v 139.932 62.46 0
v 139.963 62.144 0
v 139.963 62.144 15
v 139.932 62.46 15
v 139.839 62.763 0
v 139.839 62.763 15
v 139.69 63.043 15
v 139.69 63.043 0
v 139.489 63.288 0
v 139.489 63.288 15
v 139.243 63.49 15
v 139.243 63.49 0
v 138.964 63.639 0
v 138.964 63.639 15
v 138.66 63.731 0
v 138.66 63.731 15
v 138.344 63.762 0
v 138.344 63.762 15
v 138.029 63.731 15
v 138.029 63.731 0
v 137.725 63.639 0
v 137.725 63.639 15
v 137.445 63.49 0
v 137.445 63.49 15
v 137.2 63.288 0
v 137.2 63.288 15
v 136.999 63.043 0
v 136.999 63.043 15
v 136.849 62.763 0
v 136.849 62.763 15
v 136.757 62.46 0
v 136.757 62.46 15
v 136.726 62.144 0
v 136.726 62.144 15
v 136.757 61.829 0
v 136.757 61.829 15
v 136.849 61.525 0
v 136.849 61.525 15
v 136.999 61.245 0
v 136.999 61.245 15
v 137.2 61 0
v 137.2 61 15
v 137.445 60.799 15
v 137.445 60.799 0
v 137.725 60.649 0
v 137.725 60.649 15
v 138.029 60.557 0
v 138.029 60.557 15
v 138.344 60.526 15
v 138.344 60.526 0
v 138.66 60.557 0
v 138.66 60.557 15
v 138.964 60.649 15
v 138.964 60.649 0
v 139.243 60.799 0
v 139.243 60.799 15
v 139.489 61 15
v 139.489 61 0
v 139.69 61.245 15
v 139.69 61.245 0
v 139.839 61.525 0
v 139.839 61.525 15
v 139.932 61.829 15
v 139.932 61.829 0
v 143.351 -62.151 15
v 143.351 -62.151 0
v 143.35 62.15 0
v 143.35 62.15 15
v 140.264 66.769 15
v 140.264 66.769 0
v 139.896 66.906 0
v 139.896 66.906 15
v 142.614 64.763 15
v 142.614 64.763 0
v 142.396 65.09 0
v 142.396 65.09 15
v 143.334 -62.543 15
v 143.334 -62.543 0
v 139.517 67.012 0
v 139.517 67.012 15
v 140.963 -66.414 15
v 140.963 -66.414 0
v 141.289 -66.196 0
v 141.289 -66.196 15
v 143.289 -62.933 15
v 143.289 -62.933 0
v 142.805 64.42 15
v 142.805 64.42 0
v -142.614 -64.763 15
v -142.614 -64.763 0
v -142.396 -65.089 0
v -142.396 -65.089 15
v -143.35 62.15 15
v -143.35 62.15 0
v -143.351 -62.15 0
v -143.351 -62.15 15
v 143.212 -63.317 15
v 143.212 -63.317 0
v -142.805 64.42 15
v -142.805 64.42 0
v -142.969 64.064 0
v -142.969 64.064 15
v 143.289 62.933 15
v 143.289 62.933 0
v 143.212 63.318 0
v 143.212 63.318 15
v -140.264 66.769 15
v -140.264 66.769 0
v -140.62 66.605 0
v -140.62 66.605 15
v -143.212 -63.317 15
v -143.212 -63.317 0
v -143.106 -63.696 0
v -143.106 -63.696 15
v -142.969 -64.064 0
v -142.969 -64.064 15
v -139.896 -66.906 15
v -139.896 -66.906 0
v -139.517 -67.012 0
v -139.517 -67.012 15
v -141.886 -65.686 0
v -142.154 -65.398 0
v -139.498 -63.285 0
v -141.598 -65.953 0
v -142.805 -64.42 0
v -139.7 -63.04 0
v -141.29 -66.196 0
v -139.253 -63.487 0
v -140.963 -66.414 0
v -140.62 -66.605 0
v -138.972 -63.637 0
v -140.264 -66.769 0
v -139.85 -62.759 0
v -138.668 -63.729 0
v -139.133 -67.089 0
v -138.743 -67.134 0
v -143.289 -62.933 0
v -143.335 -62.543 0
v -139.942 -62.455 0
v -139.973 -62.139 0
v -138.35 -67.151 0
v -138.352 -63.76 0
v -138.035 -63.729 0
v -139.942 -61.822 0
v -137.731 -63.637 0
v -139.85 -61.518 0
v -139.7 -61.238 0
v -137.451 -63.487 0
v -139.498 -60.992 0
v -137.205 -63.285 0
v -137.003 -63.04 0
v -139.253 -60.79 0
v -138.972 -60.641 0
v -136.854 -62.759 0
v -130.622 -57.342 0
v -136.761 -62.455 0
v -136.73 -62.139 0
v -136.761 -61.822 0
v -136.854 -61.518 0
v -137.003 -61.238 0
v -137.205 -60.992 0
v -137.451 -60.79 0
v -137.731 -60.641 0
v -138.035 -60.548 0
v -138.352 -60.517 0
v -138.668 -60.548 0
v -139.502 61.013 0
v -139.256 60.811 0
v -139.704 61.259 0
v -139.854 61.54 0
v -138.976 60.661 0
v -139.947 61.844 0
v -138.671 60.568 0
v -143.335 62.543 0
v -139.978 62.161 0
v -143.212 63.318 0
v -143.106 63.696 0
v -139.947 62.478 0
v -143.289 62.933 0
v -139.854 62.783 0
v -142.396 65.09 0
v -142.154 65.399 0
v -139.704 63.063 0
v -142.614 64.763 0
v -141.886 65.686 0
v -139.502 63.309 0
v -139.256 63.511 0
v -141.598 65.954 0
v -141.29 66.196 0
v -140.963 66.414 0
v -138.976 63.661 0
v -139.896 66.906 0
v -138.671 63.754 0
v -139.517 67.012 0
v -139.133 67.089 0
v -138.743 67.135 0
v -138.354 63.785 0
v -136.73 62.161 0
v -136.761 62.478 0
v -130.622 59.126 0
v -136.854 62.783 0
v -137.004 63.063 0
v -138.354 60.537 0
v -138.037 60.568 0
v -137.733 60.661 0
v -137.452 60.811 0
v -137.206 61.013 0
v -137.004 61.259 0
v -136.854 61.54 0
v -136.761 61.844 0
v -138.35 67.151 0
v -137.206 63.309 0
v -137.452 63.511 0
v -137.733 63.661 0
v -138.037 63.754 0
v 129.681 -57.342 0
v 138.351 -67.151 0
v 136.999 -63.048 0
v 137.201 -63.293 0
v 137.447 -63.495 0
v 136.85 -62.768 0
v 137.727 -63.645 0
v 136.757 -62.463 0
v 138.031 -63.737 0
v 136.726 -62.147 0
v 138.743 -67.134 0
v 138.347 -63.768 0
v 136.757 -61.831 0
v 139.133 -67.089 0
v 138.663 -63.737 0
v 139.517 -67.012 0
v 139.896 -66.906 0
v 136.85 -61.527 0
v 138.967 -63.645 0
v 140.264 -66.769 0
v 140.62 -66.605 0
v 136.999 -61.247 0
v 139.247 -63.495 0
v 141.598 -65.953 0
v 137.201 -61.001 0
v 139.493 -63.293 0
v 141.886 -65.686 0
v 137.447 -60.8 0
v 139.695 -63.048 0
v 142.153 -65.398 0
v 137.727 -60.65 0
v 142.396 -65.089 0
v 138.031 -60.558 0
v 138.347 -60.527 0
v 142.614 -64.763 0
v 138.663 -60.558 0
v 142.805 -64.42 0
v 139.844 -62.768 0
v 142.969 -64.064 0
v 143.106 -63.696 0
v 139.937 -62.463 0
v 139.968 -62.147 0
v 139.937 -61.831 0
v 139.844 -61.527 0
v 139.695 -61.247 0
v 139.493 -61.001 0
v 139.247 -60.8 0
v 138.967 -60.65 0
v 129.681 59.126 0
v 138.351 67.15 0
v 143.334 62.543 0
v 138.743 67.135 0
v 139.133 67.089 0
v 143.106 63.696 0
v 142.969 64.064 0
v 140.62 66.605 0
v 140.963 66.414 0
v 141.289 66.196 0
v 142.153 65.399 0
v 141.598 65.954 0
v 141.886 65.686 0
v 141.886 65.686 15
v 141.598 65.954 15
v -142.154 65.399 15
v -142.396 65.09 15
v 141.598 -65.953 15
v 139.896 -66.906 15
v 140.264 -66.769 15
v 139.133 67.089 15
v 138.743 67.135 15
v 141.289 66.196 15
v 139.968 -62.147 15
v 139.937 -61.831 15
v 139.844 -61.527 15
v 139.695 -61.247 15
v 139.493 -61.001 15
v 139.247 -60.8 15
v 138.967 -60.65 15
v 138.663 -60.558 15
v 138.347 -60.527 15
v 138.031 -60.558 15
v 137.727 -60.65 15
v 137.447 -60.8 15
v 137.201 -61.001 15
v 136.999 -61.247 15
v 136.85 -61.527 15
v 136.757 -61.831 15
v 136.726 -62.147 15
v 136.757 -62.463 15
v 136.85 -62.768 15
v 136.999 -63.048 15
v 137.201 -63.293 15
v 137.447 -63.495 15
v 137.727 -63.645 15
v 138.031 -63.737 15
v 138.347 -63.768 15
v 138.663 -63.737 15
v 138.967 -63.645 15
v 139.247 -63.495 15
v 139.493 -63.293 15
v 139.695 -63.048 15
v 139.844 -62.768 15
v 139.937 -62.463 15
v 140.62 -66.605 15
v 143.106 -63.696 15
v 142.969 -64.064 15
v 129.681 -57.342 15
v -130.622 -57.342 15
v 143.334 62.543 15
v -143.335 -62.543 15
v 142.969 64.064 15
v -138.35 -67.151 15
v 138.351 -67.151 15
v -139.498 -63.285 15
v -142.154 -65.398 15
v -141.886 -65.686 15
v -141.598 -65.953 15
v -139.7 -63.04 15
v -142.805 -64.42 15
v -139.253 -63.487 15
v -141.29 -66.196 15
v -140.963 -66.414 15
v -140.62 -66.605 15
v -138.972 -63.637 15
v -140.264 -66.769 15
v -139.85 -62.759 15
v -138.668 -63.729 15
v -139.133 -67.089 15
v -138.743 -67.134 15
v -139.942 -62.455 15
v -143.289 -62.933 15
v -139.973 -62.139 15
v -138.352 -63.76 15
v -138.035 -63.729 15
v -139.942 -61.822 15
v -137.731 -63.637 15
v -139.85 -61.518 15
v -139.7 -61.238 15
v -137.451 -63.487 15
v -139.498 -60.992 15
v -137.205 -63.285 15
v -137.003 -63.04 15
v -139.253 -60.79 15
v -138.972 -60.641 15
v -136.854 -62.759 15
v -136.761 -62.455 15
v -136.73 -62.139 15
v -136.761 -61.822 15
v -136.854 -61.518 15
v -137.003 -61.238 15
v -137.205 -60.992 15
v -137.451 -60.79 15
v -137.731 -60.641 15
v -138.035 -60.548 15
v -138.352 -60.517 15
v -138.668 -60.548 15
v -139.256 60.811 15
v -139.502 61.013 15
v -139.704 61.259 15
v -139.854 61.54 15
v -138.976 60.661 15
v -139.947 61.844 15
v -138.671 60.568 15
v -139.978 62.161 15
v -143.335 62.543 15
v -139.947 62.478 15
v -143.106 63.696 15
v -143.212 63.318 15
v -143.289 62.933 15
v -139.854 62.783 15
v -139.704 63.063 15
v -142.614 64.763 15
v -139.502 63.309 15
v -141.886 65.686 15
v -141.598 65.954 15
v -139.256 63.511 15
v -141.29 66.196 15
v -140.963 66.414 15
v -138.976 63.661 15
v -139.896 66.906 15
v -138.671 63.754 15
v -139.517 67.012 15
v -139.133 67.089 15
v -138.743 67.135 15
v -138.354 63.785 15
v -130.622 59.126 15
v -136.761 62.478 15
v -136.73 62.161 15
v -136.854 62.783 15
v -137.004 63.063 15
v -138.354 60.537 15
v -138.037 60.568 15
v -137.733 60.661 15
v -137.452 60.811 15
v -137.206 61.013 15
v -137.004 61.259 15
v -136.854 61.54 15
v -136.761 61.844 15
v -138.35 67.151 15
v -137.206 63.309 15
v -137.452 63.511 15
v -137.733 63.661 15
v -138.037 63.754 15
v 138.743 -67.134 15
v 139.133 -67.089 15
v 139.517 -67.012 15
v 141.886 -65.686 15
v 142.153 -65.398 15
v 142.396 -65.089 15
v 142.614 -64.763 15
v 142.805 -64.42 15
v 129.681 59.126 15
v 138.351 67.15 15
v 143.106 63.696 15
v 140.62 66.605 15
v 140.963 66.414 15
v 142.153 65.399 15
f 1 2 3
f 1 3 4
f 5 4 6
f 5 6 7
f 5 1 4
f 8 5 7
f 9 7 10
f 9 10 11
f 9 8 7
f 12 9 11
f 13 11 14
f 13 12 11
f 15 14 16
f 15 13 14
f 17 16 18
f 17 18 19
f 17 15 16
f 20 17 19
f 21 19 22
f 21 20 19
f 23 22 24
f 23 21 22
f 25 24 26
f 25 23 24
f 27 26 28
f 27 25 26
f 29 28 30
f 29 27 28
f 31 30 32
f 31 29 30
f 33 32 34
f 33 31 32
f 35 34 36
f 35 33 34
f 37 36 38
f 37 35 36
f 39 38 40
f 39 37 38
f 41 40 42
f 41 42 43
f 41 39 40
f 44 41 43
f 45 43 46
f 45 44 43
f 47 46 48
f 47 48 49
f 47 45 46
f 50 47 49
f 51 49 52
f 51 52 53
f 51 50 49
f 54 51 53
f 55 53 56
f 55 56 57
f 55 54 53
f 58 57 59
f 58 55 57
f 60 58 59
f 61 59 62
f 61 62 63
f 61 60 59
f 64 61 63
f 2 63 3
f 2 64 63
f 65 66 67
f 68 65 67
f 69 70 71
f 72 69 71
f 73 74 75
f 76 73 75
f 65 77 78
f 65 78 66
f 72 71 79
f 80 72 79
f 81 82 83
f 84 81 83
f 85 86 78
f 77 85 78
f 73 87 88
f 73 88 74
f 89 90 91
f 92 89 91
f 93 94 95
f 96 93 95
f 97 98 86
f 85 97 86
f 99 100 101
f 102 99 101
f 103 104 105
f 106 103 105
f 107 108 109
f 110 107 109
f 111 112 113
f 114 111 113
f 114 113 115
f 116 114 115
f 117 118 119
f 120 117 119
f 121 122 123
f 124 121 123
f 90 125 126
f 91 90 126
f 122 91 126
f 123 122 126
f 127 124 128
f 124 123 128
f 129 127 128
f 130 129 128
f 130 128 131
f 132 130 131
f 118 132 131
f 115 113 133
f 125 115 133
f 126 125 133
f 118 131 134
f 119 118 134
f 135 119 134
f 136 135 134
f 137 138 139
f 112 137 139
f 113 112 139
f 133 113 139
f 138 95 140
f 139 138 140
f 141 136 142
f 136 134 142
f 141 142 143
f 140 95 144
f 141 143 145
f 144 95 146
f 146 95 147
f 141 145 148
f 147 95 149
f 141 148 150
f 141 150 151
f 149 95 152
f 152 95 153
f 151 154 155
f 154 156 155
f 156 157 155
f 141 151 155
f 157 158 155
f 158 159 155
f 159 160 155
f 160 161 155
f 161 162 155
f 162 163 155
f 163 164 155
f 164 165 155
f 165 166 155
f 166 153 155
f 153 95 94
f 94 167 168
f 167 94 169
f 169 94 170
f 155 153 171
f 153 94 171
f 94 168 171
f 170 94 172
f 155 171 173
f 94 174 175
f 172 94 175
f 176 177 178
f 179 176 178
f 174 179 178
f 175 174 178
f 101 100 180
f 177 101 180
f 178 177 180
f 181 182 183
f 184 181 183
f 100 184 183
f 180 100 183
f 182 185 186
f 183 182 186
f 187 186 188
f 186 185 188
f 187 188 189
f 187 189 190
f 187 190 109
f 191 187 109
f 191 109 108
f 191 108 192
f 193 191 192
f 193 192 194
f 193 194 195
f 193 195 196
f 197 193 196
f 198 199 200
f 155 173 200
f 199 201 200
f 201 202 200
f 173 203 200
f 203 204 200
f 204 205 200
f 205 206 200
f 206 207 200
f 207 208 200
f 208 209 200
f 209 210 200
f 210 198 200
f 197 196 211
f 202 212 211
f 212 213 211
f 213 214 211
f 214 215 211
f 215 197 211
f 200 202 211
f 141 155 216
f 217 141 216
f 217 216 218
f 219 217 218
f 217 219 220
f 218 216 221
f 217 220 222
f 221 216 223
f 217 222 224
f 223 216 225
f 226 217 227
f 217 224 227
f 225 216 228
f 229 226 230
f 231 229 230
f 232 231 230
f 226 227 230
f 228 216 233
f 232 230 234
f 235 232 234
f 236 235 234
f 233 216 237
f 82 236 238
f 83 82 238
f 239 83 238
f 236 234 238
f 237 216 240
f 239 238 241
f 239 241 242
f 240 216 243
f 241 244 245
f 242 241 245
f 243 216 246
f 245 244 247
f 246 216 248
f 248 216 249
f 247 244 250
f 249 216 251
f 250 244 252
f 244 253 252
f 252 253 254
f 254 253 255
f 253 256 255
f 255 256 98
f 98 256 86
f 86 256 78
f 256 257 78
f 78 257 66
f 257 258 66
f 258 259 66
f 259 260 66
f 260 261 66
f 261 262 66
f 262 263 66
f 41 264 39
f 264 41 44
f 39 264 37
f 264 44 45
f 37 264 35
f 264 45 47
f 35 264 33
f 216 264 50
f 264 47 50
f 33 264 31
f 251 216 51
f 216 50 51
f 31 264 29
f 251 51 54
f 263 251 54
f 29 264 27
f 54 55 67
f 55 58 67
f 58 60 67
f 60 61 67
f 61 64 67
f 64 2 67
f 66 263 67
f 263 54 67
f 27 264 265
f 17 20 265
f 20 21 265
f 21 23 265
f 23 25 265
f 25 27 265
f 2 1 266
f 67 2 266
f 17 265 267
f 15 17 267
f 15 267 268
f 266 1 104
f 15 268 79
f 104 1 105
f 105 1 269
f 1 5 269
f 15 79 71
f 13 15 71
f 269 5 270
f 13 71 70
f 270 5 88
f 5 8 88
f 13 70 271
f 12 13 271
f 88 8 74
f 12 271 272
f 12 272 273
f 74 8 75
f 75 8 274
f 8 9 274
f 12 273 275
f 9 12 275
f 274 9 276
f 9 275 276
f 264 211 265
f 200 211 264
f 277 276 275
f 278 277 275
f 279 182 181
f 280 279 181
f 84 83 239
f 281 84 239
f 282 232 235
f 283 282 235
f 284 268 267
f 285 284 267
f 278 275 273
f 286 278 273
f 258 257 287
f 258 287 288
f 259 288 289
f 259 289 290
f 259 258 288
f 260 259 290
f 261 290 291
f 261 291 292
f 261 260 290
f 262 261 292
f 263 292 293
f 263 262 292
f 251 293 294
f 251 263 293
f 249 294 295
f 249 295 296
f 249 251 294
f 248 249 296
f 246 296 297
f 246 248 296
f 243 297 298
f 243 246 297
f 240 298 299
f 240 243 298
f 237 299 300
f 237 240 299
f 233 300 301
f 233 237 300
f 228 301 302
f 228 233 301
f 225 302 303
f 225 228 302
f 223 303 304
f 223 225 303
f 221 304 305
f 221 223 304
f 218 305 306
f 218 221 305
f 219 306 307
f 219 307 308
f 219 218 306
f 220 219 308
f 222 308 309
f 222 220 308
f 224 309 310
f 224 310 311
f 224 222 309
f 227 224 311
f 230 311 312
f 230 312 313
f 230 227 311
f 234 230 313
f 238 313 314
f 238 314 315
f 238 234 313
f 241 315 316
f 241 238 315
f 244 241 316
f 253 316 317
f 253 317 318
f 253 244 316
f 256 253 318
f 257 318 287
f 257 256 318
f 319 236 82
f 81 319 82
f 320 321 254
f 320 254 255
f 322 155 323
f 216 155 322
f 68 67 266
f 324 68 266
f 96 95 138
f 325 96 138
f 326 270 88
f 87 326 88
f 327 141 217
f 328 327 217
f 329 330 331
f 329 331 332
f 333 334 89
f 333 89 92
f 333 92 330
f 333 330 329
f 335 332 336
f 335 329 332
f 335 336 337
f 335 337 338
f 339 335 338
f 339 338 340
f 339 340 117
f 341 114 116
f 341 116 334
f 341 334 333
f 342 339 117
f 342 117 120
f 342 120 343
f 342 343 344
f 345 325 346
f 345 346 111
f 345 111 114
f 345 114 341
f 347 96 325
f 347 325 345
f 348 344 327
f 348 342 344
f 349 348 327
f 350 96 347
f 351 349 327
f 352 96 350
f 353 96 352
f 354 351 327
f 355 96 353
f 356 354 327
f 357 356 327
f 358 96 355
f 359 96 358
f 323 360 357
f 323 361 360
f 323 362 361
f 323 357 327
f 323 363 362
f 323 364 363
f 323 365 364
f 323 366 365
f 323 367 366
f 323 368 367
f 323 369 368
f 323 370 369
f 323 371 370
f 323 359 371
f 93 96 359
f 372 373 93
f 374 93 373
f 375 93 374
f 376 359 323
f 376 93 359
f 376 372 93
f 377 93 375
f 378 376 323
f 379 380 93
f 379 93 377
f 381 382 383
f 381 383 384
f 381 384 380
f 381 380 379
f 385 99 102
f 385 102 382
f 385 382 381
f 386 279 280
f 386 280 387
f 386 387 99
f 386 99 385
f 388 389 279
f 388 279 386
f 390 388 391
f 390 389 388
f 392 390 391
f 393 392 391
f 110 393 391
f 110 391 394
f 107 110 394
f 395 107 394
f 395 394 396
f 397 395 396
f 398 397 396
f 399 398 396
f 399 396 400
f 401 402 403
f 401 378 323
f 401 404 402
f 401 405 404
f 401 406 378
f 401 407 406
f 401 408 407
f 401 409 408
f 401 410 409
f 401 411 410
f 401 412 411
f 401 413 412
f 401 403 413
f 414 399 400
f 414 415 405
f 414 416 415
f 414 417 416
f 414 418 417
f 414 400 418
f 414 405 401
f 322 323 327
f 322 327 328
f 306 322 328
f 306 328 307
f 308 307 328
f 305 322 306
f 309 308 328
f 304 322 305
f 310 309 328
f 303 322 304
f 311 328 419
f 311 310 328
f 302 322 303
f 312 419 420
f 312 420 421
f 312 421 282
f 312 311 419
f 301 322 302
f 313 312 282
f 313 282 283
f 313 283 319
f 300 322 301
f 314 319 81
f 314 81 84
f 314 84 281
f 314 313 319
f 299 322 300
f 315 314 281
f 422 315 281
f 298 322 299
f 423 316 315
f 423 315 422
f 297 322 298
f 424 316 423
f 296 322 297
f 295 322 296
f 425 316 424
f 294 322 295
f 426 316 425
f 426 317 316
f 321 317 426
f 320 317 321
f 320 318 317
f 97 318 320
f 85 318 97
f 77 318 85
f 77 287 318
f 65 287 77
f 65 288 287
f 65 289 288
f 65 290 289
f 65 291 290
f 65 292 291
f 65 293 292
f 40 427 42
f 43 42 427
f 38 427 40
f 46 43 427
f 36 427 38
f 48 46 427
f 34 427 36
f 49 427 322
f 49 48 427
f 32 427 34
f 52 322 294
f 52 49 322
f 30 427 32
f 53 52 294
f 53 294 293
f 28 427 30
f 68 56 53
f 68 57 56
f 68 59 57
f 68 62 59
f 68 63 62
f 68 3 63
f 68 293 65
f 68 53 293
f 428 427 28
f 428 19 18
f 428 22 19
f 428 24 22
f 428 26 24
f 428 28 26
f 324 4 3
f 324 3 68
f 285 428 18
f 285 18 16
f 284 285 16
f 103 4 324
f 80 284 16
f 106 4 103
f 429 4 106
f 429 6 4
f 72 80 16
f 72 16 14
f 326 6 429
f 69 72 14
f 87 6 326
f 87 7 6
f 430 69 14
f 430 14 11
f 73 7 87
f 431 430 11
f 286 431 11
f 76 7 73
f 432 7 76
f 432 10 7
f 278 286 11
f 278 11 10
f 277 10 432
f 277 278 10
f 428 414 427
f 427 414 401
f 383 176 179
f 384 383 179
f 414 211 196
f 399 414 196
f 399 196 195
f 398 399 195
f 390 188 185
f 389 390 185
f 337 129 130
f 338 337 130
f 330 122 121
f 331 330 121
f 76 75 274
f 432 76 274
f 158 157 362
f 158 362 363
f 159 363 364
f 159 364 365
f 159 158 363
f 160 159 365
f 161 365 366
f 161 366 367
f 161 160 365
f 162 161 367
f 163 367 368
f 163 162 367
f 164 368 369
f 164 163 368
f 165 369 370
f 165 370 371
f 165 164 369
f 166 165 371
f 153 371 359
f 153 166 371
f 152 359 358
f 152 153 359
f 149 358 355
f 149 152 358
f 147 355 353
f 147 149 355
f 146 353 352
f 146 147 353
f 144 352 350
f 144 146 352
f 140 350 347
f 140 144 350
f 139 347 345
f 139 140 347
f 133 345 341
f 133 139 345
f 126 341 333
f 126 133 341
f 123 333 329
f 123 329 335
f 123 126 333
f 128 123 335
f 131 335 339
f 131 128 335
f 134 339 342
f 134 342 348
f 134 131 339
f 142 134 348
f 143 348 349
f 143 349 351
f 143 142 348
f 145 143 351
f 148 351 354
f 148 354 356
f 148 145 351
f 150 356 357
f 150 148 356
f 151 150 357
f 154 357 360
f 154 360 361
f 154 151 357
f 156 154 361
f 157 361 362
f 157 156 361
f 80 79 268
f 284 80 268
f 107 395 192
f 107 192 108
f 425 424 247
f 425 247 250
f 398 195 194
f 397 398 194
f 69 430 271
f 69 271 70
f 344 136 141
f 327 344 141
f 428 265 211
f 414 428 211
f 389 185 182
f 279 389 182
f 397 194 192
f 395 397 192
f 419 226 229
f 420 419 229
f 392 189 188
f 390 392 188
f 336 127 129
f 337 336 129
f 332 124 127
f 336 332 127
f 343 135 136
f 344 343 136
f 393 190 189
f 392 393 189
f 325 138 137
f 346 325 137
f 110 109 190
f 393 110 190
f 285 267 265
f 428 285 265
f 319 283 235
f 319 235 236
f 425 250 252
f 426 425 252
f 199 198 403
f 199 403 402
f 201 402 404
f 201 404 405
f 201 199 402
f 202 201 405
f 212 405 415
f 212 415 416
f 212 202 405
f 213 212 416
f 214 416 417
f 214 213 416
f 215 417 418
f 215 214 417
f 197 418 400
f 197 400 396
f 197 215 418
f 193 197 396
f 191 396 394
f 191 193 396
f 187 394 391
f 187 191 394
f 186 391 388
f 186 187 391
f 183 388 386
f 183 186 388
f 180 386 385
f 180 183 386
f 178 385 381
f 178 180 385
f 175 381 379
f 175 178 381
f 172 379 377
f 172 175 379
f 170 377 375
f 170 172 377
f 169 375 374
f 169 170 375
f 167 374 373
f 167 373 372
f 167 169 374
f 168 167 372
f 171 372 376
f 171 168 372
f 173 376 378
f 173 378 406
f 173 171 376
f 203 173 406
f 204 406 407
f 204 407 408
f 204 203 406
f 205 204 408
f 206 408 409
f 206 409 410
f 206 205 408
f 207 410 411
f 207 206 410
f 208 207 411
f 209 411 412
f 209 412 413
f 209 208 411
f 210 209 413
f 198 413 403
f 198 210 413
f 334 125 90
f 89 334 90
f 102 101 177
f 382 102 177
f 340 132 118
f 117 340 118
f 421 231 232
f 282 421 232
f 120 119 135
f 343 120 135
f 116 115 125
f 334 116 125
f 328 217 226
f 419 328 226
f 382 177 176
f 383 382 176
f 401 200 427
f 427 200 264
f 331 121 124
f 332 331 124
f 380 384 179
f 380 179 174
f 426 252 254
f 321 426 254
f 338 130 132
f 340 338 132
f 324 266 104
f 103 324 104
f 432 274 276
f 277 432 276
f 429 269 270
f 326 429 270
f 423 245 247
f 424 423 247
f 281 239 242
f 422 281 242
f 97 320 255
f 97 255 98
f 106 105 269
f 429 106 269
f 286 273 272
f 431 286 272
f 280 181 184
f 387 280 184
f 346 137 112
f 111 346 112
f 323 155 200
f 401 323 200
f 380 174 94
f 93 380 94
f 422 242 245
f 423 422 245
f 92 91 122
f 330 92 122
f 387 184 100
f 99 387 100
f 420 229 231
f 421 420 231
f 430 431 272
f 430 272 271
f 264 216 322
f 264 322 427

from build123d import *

# Parameters (mm, degrees)
F0_R     = 1.621513
F0_R_2   = 1.620764
F0_W     = 260.302752
F0_H     = 116.467979
F0_R_3   = 1.624073
F0_R_4   = 1.618261
F1_DEPTH = 15


with BuildPart() as f1:
    # F0 (on Top) → F1 (new body)
    with BuildSketch(Plane.XY):
        Polygon((138.743147, 67.134982), (138.351147, 67.149982), (-138.350253, 67.150982), (-138.742993, 67.134982), (-139.132953, 67.088982), (-139.517453, 67.011982), (-139.896403, 66.905982), (-140.264343, 66.768982), (-140.619873, 66.604982), (-140.963003, 66.413982), (-141.289603, 66.195982), (-141.598283, 65.953982), (-141.886293, 65.685982), (-142.153633, 65.398982), (-142.396163, 65.089982), (-142.613896, 64.762982), (-142.805443, 64.419982), (-142.969429, 64.063982), (-143.105855, 63.695982), (-143.211965, 63.317982), (-143.289135, 62.932982), (-143.33461, 62.542982), (-143.349768, 62.149982), (-143.351146, -62.150088), (-143.33461, -62.542838), (-143.289135, -62.932798), (-143.211965, -63.317288), (-143.105855, -63.696238), (-142.969429, -64.064178), (-142.805443, -64.419708), (-142.613896, -64.762838), (-142.396163, -65.089438), (-142.153633, -65.398118), (-141.886293, -65.686128), (-141.598283, -65.953468), (-141.289603, -66.195998), (-140.963003, -66.41373), (-140.619873, -66.605278), (-140.264343, -66.769266), (-139.896403, -66.905691), (-139.517453, -67.0118), (-139.132953, -67.08897), (-138.742993, -67.134446), (-138.350253, -67.150982), (138.351147, -67.150982), (138.743147, -67.134446), (139.133147, -67.08897), (139.517147, -67.0118), (139.896147, -66.905691), (140.264147, -66.769266), (140.620147, -66.605278), (140.963147, -66.41373), (141.289147, -66.195998), (141.598147, -65.953468), (141.886147, -65.686128), (142.153147, -65.398118), (142.396147, -65.089438), (142.614147, -64.762838), (142.805147, -64.419708), (142.969147, -64.064178), (143.106147, -63.696238), (143.212147, -63.317288), (143.289147, -62.932798), (143.334147, -62.542838), (143.351147, -62.151458), (143.350147, 62.149982), (143.334147, 62.542982), (143.289147, 62.932982), (143.212147, 63.317982), (143.106147, 63.695982), (142.969147, 64.063982), (142.805147, 64.419982), (142.614147, 64.762982), (142.396147, 65.089982), (142.153147, 65.398982), (141.886147, 65.685982), (141.598147, 65.953982), (141.289147, 66.195982), (140.963147, 66.413982), (140.620147, 66.604982), (140.264147, 66.768982), (139.896147, 66.905982), (139.517147, 67.011982), (139.133147, 67.088982), align=None)
        with Locations((-138.351685, -62.138656)):
            Circle(F0_R, mode=Mode.SUBTRACT)
        with Locations((138.346991, -62.147275)):
            Circle(F0_R_2, mode=Mode.SUBTRACT)
        with Locations((-0.470817, 0.892164)):
            Rectangle(F0_W, F0_H, mode=Mode.SUBTRACT)
        with Locations((-138.354012, 62.161052)):
            Circle(F0_R_3, mode=Mode.SUBTRACT)
        with Locations((138.34434, 62.144211)):
            Circle(F0_R_4, mode=Mode.SUBTRACT)
    extrude(amount=F1_DEPTH)


solid = f1.part
